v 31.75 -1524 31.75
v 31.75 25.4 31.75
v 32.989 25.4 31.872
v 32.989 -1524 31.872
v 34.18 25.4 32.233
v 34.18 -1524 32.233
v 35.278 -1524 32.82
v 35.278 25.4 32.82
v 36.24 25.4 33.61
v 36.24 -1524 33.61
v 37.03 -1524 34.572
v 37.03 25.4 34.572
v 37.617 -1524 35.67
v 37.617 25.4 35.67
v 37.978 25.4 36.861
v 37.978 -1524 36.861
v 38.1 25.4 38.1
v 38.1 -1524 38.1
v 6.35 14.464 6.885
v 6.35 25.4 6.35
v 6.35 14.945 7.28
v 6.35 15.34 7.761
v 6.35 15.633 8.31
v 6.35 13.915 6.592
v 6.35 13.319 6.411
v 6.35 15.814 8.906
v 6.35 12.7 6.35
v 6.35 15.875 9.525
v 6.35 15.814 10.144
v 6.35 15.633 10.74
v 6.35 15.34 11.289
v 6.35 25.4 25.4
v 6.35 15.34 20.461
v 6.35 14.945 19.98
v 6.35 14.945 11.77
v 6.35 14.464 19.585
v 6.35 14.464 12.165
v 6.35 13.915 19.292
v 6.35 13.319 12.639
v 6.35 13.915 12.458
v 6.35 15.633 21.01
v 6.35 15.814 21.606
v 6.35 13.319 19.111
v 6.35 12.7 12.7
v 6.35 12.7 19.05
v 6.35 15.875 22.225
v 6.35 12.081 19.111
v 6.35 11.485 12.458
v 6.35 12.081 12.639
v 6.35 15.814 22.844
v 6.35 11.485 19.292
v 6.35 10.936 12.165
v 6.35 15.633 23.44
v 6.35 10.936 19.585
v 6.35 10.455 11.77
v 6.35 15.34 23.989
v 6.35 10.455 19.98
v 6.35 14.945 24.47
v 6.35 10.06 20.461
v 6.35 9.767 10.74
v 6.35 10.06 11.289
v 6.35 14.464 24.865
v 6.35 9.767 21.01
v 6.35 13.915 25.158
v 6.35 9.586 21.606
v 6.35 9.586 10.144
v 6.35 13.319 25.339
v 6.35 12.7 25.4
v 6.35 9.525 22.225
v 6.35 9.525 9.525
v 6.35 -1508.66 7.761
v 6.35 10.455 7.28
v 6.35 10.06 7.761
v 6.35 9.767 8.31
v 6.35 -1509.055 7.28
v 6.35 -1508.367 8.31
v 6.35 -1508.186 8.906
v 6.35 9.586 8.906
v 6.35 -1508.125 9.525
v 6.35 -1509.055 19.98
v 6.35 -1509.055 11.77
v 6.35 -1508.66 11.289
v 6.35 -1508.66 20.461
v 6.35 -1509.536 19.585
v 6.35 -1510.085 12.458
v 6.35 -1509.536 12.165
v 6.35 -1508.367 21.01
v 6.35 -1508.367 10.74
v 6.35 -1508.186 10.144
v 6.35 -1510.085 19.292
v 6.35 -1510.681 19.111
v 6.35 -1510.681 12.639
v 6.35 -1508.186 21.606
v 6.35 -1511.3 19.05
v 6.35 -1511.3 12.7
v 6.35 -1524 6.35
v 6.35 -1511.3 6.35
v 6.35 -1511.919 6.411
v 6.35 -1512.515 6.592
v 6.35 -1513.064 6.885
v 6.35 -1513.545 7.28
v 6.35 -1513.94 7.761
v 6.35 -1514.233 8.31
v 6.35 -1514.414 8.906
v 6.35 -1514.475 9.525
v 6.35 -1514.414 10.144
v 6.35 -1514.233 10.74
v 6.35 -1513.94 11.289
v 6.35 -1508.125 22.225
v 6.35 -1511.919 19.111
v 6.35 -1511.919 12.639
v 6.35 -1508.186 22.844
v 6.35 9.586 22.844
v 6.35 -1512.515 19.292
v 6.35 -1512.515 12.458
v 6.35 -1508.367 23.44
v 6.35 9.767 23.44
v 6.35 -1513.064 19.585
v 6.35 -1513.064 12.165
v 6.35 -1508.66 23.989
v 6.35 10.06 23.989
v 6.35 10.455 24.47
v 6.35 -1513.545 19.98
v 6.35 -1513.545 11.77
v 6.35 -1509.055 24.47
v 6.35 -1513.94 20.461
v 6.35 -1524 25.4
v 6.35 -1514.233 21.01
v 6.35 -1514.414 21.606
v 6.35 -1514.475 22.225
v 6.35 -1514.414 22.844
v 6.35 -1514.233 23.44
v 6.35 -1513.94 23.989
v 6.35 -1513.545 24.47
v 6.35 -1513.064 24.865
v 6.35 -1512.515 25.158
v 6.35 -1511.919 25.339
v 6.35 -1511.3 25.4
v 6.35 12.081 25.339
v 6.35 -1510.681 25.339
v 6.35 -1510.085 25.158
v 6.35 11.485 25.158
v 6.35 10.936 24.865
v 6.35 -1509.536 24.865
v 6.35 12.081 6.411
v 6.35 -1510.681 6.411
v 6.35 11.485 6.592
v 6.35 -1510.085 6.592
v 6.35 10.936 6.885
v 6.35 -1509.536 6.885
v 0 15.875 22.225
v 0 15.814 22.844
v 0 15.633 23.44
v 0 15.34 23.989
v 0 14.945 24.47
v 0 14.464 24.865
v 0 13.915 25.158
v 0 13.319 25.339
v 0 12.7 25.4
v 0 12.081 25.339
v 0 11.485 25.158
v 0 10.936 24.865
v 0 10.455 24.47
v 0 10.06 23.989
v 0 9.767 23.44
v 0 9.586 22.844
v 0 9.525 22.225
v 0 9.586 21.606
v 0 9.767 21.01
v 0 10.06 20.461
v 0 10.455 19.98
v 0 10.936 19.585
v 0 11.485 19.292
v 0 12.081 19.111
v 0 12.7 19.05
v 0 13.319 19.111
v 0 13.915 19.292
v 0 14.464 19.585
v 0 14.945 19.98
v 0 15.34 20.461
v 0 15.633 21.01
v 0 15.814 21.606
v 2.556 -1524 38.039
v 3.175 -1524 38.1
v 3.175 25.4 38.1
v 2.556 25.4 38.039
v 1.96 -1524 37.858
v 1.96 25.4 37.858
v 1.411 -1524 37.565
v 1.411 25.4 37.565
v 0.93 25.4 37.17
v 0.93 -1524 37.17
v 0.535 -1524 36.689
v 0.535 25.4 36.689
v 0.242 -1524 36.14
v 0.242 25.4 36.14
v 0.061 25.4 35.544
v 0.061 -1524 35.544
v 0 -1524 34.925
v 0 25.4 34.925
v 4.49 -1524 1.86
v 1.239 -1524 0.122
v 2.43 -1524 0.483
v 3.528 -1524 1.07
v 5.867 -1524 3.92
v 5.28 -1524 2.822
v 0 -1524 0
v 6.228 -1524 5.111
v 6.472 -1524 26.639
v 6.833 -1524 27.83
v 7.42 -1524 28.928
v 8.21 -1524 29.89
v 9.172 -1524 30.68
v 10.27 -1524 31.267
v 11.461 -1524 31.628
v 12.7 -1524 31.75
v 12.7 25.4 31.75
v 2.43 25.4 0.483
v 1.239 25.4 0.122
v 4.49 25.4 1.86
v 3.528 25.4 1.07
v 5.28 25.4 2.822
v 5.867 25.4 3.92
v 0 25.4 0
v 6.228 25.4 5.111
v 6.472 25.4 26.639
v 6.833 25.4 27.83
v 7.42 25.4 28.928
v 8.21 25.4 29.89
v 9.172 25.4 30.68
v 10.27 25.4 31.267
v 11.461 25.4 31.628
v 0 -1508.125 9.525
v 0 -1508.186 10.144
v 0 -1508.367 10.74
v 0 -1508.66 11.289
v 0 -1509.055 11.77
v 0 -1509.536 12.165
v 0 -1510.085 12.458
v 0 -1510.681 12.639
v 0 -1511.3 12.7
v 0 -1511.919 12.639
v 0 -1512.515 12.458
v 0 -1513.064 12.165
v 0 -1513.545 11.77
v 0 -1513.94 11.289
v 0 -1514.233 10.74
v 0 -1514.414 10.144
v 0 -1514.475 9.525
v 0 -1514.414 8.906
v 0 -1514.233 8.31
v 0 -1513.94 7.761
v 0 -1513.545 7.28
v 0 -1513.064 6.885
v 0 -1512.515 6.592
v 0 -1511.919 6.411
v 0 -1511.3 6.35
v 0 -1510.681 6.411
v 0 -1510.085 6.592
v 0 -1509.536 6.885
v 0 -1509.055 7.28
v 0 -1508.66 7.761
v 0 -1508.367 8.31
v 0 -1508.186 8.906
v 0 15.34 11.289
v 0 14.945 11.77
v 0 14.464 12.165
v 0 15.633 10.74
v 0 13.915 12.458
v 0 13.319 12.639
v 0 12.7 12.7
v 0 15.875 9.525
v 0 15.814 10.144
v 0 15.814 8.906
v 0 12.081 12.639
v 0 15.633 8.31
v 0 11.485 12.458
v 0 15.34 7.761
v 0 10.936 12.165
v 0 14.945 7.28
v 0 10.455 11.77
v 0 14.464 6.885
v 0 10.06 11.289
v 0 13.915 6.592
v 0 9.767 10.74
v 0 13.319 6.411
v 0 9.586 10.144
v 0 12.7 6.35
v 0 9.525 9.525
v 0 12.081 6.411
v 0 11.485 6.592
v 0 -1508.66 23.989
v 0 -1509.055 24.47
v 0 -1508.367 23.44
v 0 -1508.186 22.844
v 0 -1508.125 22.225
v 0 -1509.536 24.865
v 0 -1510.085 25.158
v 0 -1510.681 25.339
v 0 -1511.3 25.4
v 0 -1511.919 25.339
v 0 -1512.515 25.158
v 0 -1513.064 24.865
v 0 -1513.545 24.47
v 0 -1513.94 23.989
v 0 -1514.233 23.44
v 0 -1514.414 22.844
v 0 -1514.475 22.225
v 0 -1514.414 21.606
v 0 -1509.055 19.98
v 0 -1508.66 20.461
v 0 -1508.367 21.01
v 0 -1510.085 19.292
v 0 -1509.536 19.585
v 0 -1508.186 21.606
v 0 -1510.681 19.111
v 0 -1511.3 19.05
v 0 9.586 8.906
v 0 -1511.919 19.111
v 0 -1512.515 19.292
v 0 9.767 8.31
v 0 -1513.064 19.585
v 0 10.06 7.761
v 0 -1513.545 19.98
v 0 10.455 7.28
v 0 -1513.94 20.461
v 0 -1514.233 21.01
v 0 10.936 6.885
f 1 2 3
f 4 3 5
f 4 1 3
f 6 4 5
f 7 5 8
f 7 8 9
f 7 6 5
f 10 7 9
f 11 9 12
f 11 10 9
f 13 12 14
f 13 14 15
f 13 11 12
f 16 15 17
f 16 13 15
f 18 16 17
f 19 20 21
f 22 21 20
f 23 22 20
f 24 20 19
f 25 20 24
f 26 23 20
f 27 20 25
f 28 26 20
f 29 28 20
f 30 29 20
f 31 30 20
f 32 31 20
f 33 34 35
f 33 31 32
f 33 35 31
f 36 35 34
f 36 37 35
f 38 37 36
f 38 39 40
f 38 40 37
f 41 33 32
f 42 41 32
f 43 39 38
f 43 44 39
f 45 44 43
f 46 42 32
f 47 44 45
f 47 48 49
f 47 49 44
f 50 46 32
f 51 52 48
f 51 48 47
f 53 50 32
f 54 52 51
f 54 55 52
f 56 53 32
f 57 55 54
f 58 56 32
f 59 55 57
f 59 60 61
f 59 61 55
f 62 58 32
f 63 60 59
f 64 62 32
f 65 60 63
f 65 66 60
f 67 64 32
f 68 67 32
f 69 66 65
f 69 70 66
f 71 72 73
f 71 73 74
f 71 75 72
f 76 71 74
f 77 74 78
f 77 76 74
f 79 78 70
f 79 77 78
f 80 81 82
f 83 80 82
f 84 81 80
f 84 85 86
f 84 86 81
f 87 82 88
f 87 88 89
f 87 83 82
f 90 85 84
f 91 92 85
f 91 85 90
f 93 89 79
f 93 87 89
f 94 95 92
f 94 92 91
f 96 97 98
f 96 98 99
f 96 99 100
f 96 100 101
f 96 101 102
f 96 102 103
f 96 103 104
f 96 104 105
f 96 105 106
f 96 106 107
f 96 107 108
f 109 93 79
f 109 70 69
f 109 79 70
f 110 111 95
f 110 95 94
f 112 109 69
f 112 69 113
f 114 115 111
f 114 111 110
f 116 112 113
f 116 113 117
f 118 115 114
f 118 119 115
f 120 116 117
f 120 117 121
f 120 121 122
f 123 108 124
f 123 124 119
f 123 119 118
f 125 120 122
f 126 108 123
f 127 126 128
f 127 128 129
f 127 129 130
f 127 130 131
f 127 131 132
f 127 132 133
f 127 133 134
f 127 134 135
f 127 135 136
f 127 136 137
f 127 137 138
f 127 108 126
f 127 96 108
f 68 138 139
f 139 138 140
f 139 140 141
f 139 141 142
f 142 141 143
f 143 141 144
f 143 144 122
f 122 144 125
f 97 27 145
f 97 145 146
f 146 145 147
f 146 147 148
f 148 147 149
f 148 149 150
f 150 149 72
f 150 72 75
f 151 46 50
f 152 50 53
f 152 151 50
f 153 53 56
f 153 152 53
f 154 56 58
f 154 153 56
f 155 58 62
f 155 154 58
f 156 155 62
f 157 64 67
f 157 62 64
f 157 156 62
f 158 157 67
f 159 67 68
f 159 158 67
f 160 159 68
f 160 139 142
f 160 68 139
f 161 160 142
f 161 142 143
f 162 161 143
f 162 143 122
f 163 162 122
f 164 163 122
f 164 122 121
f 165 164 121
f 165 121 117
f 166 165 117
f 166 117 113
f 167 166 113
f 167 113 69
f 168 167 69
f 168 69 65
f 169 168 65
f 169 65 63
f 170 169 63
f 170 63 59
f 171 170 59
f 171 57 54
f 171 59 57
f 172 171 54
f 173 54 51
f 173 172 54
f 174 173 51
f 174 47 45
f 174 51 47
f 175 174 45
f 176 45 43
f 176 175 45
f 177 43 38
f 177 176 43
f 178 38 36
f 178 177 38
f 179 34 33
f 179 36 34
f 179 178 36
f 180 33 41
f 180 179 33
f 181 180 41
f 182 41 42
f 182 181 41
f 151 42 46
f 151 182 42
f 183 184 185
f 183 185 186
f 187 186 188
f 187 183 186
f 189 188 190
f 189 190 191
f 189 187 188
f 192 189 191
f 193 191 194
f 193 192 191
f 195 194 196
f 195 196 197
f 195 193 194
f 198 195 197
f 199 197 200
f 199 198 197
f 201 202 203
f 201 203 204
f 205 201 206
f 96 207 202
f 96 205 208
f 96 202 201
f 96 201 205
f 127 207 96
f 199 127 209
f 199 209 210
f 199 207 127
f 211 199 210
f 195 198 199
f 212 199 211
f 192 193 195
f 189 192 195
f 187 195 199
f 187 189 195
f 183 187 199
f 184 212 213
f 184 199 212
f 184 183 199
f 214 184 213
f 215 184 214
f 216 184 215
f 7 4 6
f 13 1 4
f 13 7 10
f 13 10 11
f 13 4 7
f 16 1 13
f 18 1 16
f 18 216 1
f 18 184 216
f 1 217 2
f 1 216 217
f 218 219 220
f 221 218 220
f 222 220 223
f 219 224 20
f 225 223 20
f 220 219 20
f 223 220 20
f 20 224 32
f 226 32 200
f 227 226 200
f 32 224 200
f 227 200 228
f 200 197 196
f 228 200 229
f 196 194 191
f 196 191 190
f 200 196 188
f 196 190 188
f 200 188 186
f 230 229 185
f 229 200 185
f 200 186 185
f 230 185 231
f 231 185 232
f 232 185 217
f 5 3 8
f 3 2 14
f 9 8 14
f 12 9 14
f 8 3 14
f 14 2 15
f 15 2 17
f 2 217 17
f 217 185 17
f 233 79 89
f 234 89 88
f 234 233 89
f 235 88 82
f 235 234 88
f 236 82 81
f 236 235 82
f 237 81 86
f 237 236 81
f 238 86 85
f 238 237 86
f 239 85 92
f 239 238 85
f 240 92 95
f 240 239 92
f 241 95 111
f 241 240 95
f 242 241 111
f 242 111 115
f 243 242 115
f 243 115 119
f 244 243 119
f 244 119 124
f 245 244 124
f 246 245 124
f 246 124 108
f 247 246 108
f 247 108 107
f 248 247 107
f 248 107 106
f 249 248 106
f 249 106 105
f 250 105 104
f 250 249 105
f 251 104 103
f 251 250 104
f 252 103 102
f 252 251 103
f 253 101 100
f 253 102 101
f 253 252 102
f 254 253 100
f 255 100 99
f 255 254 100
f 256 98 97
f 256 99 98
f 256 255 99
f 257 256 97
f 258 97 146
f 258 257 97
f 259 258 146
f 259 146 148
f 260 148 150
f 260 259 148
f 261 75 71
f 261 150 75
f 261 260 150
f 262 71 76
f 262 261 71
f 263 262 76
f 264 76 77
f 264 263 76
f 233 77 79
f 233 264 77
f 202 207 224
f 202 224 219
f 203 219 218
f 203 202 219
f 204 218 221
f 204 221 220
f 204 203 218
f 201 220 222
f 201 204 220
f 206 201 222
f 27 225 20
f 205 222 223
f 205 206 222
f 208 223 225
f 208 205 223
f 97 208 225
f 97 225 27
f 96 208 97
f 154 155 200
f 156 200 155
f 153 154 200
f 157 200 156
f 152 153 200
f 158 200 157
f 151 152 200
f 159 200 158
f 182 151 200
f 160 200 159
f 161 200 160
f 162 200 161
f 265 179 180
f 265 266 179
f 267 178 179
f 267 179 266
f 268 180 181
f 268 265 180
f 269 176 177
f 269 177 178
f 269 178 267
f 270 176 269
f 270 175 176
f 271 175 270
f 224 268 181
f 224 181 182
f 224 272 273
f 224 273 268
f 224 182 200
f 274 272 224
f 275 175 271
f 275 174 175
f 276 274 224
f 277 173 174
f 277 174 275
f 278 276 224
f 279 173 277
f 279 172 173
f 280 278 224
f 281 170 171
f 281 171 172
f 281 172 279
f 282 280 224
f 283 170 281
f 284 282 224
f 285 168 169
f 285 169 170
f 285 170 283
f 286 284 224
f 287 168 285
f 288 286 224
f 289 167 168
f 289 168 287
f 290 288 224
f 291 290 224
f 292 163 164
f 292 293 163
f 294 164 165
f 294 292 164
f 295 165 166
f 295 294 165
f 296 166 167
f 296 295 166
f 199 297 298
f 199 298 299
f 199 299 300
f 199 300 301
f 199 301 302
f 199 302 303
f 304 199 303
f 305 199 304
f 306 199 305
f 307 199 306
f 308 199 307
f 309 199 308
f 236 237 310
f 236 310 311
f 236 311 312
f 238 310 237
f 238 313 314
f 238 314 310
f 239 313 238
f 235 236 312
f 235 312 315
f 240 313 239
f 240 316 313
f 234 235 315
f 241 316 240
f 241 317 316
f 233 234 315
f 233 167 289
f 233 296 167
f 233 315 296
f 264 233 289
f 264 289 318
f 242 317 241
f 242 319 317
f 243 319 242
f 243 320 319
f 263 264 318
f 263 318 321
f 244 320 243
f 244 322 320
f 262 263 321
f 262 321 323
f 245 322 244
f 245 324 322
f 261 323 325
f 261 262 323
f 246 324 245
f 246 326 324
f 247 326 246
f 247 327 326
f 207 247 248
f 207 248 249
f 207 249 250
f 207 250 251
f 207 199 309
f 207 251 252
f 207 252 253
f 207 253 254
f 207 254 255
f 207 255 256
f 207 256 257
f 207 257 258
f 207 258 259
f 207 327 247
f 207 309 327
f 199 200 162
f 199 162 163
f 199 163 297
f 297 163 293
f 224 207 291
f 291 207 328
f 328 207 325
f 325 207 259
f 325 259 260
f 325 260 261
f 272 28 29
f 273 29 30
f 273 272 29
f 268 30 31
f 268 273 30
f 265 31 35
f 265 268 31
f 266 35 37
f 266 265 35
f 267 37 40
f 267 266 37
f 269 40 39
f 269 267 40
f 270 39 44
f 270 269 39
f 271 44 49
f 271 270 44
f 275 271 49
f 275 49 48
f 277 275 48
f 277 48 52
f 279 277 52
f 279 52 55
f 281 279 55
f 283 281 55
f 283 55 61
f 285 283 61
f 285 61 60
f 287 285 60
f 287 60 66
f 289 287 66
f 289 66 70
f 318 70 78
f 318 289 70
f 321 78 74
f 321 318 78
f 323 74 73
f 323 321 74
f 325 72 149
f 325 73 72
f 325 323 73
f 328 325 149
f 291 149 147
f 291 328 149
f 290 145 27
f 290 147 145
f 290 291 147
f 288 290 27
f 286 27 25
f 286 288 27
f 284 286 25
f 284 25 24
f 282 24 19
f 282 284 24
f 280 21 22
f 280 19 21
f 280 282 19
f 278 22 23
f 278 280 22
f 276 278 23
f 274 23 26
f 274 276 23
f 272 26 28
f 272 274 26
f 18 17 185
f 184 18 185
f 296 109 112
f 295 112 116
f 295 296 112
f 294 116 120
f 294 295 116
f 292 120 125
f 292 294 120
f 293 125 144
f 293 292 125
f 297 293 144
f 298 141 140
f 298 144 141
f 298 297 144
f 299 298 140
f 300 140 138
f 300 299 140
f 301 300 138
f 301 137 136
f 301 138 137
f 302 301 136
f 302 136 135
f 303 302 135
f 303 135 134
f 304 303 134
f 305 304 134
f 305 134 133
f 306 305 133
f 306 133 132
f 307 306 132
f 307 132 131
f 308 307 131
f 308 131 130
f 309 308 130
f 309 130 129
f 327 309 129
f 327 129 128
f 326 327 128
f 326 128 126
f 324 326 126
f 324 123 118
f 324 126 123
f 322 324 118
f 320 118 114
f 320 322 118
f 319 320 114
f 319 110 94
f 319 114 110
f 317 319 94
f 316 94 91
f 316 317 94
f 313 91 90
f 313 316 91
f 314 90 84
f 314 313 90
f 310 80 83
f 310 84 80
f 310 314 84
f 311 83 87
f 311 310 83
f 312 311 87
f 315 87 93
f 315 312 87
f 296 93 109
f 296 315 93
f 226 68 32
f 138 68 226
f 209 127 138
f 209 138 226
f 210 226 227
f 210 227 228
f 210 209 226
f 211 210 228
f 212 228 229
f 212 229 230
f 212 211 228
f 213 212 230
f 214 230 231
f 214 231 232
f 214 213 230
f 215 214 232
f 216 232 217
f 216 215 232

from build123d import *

# Parameters (mm, degrees)
F1_DEPTH      = 1524
F1_DEPTH_BACK = 25.4
F2_R          = 3.175
F3_DEPTH      = 38.1


with BuildPart() as f1:
    # F0 (on Front) → F1 (new body, two sides)
    with BuildSketch(Plane.XZ) as f1_sk:
        with BuildLine():
            Line((38.1, 38.1), (3.175, 38.1))
            ThreePointArc((3.175, 38.1), (0.929936, 37.170064), (0, 34.925))
            Line((0, 34.925), (0, 0))
            ThreePointArc((0, 0), (4.490128, 1.859872), (6.35, 6.35))
            Line((6.35, 6.35), (6.35, 25.4))
            ThreePointArc((6.35, 25.4), (8.209872, 29.890128), (12.7, 31.75))
            Line((12.7, 31.75), (31.75, 31.75))
            ThreePointArc((31.75, 31.75), (36.240128, 33.609872), (38.1, 38.1))
        make_face()
    extrude(amount=F1_DEPTH)
    extrude(f1_sk.sketch, amount=-F1_DEPTH_BACK)

    # F2 (on Right) → F3 (cut)
    with BuildSketch(Plane.YZ):
        with Locations((12.7, 9.525)):
            Circle(F2_R)
        with Locations((12.7, 22.225)):
            Circle(F2_R)
        with Locations((-1511.3, 9.525)):
            Circle(F2_R)
        with Locations((-1511.3, 22.225)):
            Circle(F2_R)
    extrude(amount=F3_DEPTH, mode=Mode.SUBTRACT)


solid = f1.part
